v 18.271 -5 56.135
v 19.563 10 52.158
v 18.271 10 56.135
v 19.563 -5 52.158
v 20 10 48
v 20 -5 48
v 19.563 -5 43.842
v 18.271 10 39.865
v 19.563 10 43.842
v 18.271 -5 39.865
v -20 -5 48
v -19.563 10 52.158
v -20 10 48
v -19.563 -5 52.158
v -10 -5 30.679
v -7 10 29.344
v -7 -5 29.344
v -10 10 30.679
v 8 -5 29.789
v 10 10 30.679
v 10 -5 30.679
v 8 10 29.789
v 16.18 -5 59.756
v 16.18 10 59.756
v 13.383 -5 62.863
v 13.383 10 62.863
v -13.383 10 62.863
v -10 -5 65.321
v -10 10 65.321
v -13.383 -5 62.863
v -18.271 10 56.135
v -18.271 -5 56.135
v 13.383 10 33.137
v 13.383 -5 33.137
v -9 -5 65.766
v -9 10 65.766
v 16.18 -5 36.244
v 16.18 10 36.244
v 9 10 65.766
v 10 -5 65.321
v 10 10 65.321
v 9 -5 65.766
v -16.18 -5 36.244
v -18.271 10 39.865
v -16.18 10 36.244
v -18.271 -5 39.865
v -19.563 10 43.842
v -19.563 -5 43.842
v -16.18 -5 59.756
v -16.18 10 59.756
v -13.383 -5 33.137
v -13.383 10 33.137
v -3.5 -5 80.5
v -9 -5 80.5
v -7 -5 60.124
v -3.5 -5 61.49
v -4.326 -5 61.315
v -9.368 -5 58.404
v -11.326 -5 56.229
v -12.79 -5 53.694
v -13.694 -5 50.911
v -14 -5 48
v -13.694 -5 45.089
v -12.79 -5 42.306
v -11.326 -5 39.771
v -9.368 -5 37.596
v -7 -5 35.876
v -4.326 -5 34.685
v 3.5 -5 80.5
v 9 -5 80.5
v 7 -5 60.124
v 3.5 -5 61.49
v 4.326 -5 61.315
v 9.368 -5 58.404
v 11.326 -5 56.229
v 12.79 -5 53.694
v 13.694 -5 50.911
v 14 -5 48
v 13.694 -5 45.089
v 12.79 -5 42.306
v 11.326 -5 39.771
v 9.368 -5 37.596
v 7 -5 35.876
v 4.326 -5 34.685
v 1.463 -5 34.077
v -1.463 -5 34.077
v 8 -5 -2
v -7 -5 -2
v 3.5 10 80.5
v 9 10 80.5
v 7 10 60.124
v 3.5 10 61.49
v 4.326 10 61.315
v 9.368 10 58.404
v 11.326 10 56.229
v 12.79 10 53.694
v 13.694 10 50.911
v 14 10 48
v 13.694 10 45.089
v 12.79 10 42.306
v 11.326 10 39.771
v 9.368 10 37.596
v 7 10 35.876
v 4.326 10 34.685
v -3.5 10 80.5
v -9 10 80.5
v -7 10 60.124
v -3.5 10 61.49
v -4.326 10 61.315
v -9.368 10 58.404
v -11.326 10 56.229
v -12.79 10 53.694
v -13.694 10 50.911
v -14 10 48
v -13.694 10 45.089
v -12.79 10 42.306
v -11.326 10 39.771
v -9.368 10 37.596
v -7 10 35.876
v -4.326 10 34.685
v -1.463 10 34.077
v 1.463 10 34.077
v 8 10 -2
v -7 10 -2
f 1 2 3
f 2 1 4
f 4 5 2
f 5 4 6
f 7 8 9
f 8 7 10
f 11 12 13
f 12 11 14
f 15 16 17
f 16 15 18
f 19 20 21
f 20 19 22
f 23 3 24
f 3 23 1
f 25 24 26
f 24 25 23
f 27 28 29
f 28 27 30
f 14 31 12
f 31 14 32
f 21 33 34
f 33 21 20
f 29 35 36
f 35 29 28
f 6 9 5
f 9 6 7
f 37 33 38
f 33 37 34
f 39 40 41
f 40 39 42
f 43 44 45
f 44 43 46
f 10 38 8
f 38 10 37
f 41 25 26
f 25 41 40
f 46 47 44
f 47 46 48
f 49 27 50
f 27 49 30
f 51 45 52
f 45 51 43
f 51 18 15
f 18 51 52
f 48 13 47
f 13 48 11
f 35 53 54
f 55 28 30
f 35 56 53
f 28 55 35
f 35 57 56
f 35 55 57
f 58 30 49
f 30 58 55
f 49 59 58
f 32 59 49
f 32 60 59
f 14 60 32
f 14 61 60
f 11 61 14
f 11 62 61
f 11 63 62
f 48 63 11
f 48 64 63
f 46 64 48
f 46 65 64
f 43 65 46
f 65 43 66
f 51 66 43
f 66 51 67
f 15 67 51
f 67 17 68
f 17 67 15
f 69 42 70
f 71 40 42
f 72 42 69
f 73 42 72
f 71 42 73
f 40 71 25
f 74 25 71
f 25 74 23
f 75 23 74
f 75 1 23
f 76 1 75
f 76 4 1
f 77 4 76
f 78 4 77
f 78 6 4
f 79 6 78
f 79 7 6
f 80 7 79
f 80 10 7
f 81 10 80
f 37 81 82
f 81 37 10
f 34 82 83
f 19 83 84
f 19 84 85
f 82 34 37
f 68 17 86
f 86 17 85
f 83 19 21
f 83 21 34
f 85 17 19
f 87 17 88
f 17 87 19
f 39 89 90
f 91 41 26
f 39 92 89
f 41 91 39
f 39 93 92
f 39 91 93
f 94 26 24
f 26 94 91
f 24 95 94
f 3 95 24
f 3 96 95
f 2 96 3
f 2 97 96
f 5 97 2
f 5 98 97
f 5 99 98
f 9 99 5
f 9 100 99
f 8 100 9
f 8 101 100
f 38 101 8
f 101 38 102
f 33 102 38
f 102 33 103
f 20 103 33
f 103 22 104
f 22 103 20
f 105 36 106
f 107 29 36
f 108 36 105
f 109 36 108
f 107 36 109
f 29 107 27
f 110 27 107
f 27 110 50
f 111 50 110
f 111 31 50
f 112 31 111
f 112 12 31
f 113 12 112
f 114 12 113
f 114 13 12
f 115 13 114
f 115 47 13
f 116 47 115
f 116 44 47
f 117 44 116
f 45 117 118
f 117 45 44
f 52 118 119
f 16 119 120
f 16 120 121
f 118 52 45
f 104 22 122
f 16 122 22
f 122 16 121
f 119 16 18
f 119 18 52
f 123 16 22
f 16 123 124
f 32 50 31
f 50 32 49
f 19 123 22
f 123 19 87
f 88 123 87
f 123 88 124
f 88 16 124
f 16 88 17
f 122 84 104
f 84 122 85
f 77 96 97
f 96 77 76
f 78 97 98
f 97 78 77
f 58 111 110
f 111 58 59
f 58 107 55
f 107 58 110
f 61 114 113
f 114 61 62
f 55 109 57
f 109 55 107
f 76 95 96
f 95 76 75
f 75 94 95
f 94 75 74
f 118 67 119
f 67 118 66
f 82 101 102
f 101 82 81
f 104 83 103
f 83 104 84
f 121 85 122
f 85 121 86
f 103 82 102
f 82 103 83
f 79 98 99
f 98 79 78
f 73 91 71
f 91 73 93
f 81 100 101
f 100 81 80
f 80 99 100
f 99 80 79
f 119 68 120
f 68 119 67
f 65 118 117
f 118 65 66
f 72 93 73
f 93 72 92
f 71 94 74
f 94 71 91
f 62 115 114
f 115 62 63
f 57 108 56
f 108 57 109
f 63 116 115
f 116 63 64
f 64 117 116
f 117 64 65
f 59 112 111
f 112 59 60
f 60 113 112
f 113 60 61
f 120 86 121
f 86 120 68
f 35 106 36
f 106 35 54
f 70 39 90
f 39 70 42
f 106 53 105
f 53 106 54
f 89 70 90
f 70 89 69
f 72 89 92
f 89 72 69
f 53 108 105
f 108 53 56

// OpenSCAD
difference() 
{ 
// ode�et distan�n� mezery


union() 
{
// p�i�ten� patic pro sta�en�

difference() 
{ 
// diffference pro  otvor pro osazen� na ty�



union() 
{
// union pro v�lec napojen� na cylinder pro zasazen� do rukojeti

union() 
// union pro p�ipojen� cylinderu na v�lec
{


//cylinder(h = 14, r1 = 17, r2 = 10, center = true); 
//cylinder-nepouzite skoseni napojeni tyce pro usazeni v rukojeti

//zakladn�
translate([0,10,48]) rotate ([90,0,0])cylinder(h = 15, r=20);
// 40 je nastavena vnitrni prumer na 35 a vnejsi na 40
        
} 
#translate([-7,-5,-2]) cube([15,15,35], center = false);

//tloustka upnutí 15mm 
// umisteni ctverce pro dosazeni do rukojeti
//tloustka operky je 4mm + 14mm pro zesileni
//19 je posun nahoru a dolu/////35 vyska propojky
}
translate([0,10,48]) rotate ([90,0,0])cylinder(h = 20, r=14);
// odecitaci valec pro otvor na osazen� ty�e
}
translate([0,2.5,73]) rotate ([90,0,0]) cube(size = [18,15,15], center = true);
//sloupky pro utazeni
}
translate([0,10,75]) rotate ([0,0,0])cube(size = [7,50,40], center = true);
//odecet distancni mezery
}        


//# pro zviditeleneni
//priblizeni shift+prav tlacitko mysi+ pousouvani dopredu/dozadu
